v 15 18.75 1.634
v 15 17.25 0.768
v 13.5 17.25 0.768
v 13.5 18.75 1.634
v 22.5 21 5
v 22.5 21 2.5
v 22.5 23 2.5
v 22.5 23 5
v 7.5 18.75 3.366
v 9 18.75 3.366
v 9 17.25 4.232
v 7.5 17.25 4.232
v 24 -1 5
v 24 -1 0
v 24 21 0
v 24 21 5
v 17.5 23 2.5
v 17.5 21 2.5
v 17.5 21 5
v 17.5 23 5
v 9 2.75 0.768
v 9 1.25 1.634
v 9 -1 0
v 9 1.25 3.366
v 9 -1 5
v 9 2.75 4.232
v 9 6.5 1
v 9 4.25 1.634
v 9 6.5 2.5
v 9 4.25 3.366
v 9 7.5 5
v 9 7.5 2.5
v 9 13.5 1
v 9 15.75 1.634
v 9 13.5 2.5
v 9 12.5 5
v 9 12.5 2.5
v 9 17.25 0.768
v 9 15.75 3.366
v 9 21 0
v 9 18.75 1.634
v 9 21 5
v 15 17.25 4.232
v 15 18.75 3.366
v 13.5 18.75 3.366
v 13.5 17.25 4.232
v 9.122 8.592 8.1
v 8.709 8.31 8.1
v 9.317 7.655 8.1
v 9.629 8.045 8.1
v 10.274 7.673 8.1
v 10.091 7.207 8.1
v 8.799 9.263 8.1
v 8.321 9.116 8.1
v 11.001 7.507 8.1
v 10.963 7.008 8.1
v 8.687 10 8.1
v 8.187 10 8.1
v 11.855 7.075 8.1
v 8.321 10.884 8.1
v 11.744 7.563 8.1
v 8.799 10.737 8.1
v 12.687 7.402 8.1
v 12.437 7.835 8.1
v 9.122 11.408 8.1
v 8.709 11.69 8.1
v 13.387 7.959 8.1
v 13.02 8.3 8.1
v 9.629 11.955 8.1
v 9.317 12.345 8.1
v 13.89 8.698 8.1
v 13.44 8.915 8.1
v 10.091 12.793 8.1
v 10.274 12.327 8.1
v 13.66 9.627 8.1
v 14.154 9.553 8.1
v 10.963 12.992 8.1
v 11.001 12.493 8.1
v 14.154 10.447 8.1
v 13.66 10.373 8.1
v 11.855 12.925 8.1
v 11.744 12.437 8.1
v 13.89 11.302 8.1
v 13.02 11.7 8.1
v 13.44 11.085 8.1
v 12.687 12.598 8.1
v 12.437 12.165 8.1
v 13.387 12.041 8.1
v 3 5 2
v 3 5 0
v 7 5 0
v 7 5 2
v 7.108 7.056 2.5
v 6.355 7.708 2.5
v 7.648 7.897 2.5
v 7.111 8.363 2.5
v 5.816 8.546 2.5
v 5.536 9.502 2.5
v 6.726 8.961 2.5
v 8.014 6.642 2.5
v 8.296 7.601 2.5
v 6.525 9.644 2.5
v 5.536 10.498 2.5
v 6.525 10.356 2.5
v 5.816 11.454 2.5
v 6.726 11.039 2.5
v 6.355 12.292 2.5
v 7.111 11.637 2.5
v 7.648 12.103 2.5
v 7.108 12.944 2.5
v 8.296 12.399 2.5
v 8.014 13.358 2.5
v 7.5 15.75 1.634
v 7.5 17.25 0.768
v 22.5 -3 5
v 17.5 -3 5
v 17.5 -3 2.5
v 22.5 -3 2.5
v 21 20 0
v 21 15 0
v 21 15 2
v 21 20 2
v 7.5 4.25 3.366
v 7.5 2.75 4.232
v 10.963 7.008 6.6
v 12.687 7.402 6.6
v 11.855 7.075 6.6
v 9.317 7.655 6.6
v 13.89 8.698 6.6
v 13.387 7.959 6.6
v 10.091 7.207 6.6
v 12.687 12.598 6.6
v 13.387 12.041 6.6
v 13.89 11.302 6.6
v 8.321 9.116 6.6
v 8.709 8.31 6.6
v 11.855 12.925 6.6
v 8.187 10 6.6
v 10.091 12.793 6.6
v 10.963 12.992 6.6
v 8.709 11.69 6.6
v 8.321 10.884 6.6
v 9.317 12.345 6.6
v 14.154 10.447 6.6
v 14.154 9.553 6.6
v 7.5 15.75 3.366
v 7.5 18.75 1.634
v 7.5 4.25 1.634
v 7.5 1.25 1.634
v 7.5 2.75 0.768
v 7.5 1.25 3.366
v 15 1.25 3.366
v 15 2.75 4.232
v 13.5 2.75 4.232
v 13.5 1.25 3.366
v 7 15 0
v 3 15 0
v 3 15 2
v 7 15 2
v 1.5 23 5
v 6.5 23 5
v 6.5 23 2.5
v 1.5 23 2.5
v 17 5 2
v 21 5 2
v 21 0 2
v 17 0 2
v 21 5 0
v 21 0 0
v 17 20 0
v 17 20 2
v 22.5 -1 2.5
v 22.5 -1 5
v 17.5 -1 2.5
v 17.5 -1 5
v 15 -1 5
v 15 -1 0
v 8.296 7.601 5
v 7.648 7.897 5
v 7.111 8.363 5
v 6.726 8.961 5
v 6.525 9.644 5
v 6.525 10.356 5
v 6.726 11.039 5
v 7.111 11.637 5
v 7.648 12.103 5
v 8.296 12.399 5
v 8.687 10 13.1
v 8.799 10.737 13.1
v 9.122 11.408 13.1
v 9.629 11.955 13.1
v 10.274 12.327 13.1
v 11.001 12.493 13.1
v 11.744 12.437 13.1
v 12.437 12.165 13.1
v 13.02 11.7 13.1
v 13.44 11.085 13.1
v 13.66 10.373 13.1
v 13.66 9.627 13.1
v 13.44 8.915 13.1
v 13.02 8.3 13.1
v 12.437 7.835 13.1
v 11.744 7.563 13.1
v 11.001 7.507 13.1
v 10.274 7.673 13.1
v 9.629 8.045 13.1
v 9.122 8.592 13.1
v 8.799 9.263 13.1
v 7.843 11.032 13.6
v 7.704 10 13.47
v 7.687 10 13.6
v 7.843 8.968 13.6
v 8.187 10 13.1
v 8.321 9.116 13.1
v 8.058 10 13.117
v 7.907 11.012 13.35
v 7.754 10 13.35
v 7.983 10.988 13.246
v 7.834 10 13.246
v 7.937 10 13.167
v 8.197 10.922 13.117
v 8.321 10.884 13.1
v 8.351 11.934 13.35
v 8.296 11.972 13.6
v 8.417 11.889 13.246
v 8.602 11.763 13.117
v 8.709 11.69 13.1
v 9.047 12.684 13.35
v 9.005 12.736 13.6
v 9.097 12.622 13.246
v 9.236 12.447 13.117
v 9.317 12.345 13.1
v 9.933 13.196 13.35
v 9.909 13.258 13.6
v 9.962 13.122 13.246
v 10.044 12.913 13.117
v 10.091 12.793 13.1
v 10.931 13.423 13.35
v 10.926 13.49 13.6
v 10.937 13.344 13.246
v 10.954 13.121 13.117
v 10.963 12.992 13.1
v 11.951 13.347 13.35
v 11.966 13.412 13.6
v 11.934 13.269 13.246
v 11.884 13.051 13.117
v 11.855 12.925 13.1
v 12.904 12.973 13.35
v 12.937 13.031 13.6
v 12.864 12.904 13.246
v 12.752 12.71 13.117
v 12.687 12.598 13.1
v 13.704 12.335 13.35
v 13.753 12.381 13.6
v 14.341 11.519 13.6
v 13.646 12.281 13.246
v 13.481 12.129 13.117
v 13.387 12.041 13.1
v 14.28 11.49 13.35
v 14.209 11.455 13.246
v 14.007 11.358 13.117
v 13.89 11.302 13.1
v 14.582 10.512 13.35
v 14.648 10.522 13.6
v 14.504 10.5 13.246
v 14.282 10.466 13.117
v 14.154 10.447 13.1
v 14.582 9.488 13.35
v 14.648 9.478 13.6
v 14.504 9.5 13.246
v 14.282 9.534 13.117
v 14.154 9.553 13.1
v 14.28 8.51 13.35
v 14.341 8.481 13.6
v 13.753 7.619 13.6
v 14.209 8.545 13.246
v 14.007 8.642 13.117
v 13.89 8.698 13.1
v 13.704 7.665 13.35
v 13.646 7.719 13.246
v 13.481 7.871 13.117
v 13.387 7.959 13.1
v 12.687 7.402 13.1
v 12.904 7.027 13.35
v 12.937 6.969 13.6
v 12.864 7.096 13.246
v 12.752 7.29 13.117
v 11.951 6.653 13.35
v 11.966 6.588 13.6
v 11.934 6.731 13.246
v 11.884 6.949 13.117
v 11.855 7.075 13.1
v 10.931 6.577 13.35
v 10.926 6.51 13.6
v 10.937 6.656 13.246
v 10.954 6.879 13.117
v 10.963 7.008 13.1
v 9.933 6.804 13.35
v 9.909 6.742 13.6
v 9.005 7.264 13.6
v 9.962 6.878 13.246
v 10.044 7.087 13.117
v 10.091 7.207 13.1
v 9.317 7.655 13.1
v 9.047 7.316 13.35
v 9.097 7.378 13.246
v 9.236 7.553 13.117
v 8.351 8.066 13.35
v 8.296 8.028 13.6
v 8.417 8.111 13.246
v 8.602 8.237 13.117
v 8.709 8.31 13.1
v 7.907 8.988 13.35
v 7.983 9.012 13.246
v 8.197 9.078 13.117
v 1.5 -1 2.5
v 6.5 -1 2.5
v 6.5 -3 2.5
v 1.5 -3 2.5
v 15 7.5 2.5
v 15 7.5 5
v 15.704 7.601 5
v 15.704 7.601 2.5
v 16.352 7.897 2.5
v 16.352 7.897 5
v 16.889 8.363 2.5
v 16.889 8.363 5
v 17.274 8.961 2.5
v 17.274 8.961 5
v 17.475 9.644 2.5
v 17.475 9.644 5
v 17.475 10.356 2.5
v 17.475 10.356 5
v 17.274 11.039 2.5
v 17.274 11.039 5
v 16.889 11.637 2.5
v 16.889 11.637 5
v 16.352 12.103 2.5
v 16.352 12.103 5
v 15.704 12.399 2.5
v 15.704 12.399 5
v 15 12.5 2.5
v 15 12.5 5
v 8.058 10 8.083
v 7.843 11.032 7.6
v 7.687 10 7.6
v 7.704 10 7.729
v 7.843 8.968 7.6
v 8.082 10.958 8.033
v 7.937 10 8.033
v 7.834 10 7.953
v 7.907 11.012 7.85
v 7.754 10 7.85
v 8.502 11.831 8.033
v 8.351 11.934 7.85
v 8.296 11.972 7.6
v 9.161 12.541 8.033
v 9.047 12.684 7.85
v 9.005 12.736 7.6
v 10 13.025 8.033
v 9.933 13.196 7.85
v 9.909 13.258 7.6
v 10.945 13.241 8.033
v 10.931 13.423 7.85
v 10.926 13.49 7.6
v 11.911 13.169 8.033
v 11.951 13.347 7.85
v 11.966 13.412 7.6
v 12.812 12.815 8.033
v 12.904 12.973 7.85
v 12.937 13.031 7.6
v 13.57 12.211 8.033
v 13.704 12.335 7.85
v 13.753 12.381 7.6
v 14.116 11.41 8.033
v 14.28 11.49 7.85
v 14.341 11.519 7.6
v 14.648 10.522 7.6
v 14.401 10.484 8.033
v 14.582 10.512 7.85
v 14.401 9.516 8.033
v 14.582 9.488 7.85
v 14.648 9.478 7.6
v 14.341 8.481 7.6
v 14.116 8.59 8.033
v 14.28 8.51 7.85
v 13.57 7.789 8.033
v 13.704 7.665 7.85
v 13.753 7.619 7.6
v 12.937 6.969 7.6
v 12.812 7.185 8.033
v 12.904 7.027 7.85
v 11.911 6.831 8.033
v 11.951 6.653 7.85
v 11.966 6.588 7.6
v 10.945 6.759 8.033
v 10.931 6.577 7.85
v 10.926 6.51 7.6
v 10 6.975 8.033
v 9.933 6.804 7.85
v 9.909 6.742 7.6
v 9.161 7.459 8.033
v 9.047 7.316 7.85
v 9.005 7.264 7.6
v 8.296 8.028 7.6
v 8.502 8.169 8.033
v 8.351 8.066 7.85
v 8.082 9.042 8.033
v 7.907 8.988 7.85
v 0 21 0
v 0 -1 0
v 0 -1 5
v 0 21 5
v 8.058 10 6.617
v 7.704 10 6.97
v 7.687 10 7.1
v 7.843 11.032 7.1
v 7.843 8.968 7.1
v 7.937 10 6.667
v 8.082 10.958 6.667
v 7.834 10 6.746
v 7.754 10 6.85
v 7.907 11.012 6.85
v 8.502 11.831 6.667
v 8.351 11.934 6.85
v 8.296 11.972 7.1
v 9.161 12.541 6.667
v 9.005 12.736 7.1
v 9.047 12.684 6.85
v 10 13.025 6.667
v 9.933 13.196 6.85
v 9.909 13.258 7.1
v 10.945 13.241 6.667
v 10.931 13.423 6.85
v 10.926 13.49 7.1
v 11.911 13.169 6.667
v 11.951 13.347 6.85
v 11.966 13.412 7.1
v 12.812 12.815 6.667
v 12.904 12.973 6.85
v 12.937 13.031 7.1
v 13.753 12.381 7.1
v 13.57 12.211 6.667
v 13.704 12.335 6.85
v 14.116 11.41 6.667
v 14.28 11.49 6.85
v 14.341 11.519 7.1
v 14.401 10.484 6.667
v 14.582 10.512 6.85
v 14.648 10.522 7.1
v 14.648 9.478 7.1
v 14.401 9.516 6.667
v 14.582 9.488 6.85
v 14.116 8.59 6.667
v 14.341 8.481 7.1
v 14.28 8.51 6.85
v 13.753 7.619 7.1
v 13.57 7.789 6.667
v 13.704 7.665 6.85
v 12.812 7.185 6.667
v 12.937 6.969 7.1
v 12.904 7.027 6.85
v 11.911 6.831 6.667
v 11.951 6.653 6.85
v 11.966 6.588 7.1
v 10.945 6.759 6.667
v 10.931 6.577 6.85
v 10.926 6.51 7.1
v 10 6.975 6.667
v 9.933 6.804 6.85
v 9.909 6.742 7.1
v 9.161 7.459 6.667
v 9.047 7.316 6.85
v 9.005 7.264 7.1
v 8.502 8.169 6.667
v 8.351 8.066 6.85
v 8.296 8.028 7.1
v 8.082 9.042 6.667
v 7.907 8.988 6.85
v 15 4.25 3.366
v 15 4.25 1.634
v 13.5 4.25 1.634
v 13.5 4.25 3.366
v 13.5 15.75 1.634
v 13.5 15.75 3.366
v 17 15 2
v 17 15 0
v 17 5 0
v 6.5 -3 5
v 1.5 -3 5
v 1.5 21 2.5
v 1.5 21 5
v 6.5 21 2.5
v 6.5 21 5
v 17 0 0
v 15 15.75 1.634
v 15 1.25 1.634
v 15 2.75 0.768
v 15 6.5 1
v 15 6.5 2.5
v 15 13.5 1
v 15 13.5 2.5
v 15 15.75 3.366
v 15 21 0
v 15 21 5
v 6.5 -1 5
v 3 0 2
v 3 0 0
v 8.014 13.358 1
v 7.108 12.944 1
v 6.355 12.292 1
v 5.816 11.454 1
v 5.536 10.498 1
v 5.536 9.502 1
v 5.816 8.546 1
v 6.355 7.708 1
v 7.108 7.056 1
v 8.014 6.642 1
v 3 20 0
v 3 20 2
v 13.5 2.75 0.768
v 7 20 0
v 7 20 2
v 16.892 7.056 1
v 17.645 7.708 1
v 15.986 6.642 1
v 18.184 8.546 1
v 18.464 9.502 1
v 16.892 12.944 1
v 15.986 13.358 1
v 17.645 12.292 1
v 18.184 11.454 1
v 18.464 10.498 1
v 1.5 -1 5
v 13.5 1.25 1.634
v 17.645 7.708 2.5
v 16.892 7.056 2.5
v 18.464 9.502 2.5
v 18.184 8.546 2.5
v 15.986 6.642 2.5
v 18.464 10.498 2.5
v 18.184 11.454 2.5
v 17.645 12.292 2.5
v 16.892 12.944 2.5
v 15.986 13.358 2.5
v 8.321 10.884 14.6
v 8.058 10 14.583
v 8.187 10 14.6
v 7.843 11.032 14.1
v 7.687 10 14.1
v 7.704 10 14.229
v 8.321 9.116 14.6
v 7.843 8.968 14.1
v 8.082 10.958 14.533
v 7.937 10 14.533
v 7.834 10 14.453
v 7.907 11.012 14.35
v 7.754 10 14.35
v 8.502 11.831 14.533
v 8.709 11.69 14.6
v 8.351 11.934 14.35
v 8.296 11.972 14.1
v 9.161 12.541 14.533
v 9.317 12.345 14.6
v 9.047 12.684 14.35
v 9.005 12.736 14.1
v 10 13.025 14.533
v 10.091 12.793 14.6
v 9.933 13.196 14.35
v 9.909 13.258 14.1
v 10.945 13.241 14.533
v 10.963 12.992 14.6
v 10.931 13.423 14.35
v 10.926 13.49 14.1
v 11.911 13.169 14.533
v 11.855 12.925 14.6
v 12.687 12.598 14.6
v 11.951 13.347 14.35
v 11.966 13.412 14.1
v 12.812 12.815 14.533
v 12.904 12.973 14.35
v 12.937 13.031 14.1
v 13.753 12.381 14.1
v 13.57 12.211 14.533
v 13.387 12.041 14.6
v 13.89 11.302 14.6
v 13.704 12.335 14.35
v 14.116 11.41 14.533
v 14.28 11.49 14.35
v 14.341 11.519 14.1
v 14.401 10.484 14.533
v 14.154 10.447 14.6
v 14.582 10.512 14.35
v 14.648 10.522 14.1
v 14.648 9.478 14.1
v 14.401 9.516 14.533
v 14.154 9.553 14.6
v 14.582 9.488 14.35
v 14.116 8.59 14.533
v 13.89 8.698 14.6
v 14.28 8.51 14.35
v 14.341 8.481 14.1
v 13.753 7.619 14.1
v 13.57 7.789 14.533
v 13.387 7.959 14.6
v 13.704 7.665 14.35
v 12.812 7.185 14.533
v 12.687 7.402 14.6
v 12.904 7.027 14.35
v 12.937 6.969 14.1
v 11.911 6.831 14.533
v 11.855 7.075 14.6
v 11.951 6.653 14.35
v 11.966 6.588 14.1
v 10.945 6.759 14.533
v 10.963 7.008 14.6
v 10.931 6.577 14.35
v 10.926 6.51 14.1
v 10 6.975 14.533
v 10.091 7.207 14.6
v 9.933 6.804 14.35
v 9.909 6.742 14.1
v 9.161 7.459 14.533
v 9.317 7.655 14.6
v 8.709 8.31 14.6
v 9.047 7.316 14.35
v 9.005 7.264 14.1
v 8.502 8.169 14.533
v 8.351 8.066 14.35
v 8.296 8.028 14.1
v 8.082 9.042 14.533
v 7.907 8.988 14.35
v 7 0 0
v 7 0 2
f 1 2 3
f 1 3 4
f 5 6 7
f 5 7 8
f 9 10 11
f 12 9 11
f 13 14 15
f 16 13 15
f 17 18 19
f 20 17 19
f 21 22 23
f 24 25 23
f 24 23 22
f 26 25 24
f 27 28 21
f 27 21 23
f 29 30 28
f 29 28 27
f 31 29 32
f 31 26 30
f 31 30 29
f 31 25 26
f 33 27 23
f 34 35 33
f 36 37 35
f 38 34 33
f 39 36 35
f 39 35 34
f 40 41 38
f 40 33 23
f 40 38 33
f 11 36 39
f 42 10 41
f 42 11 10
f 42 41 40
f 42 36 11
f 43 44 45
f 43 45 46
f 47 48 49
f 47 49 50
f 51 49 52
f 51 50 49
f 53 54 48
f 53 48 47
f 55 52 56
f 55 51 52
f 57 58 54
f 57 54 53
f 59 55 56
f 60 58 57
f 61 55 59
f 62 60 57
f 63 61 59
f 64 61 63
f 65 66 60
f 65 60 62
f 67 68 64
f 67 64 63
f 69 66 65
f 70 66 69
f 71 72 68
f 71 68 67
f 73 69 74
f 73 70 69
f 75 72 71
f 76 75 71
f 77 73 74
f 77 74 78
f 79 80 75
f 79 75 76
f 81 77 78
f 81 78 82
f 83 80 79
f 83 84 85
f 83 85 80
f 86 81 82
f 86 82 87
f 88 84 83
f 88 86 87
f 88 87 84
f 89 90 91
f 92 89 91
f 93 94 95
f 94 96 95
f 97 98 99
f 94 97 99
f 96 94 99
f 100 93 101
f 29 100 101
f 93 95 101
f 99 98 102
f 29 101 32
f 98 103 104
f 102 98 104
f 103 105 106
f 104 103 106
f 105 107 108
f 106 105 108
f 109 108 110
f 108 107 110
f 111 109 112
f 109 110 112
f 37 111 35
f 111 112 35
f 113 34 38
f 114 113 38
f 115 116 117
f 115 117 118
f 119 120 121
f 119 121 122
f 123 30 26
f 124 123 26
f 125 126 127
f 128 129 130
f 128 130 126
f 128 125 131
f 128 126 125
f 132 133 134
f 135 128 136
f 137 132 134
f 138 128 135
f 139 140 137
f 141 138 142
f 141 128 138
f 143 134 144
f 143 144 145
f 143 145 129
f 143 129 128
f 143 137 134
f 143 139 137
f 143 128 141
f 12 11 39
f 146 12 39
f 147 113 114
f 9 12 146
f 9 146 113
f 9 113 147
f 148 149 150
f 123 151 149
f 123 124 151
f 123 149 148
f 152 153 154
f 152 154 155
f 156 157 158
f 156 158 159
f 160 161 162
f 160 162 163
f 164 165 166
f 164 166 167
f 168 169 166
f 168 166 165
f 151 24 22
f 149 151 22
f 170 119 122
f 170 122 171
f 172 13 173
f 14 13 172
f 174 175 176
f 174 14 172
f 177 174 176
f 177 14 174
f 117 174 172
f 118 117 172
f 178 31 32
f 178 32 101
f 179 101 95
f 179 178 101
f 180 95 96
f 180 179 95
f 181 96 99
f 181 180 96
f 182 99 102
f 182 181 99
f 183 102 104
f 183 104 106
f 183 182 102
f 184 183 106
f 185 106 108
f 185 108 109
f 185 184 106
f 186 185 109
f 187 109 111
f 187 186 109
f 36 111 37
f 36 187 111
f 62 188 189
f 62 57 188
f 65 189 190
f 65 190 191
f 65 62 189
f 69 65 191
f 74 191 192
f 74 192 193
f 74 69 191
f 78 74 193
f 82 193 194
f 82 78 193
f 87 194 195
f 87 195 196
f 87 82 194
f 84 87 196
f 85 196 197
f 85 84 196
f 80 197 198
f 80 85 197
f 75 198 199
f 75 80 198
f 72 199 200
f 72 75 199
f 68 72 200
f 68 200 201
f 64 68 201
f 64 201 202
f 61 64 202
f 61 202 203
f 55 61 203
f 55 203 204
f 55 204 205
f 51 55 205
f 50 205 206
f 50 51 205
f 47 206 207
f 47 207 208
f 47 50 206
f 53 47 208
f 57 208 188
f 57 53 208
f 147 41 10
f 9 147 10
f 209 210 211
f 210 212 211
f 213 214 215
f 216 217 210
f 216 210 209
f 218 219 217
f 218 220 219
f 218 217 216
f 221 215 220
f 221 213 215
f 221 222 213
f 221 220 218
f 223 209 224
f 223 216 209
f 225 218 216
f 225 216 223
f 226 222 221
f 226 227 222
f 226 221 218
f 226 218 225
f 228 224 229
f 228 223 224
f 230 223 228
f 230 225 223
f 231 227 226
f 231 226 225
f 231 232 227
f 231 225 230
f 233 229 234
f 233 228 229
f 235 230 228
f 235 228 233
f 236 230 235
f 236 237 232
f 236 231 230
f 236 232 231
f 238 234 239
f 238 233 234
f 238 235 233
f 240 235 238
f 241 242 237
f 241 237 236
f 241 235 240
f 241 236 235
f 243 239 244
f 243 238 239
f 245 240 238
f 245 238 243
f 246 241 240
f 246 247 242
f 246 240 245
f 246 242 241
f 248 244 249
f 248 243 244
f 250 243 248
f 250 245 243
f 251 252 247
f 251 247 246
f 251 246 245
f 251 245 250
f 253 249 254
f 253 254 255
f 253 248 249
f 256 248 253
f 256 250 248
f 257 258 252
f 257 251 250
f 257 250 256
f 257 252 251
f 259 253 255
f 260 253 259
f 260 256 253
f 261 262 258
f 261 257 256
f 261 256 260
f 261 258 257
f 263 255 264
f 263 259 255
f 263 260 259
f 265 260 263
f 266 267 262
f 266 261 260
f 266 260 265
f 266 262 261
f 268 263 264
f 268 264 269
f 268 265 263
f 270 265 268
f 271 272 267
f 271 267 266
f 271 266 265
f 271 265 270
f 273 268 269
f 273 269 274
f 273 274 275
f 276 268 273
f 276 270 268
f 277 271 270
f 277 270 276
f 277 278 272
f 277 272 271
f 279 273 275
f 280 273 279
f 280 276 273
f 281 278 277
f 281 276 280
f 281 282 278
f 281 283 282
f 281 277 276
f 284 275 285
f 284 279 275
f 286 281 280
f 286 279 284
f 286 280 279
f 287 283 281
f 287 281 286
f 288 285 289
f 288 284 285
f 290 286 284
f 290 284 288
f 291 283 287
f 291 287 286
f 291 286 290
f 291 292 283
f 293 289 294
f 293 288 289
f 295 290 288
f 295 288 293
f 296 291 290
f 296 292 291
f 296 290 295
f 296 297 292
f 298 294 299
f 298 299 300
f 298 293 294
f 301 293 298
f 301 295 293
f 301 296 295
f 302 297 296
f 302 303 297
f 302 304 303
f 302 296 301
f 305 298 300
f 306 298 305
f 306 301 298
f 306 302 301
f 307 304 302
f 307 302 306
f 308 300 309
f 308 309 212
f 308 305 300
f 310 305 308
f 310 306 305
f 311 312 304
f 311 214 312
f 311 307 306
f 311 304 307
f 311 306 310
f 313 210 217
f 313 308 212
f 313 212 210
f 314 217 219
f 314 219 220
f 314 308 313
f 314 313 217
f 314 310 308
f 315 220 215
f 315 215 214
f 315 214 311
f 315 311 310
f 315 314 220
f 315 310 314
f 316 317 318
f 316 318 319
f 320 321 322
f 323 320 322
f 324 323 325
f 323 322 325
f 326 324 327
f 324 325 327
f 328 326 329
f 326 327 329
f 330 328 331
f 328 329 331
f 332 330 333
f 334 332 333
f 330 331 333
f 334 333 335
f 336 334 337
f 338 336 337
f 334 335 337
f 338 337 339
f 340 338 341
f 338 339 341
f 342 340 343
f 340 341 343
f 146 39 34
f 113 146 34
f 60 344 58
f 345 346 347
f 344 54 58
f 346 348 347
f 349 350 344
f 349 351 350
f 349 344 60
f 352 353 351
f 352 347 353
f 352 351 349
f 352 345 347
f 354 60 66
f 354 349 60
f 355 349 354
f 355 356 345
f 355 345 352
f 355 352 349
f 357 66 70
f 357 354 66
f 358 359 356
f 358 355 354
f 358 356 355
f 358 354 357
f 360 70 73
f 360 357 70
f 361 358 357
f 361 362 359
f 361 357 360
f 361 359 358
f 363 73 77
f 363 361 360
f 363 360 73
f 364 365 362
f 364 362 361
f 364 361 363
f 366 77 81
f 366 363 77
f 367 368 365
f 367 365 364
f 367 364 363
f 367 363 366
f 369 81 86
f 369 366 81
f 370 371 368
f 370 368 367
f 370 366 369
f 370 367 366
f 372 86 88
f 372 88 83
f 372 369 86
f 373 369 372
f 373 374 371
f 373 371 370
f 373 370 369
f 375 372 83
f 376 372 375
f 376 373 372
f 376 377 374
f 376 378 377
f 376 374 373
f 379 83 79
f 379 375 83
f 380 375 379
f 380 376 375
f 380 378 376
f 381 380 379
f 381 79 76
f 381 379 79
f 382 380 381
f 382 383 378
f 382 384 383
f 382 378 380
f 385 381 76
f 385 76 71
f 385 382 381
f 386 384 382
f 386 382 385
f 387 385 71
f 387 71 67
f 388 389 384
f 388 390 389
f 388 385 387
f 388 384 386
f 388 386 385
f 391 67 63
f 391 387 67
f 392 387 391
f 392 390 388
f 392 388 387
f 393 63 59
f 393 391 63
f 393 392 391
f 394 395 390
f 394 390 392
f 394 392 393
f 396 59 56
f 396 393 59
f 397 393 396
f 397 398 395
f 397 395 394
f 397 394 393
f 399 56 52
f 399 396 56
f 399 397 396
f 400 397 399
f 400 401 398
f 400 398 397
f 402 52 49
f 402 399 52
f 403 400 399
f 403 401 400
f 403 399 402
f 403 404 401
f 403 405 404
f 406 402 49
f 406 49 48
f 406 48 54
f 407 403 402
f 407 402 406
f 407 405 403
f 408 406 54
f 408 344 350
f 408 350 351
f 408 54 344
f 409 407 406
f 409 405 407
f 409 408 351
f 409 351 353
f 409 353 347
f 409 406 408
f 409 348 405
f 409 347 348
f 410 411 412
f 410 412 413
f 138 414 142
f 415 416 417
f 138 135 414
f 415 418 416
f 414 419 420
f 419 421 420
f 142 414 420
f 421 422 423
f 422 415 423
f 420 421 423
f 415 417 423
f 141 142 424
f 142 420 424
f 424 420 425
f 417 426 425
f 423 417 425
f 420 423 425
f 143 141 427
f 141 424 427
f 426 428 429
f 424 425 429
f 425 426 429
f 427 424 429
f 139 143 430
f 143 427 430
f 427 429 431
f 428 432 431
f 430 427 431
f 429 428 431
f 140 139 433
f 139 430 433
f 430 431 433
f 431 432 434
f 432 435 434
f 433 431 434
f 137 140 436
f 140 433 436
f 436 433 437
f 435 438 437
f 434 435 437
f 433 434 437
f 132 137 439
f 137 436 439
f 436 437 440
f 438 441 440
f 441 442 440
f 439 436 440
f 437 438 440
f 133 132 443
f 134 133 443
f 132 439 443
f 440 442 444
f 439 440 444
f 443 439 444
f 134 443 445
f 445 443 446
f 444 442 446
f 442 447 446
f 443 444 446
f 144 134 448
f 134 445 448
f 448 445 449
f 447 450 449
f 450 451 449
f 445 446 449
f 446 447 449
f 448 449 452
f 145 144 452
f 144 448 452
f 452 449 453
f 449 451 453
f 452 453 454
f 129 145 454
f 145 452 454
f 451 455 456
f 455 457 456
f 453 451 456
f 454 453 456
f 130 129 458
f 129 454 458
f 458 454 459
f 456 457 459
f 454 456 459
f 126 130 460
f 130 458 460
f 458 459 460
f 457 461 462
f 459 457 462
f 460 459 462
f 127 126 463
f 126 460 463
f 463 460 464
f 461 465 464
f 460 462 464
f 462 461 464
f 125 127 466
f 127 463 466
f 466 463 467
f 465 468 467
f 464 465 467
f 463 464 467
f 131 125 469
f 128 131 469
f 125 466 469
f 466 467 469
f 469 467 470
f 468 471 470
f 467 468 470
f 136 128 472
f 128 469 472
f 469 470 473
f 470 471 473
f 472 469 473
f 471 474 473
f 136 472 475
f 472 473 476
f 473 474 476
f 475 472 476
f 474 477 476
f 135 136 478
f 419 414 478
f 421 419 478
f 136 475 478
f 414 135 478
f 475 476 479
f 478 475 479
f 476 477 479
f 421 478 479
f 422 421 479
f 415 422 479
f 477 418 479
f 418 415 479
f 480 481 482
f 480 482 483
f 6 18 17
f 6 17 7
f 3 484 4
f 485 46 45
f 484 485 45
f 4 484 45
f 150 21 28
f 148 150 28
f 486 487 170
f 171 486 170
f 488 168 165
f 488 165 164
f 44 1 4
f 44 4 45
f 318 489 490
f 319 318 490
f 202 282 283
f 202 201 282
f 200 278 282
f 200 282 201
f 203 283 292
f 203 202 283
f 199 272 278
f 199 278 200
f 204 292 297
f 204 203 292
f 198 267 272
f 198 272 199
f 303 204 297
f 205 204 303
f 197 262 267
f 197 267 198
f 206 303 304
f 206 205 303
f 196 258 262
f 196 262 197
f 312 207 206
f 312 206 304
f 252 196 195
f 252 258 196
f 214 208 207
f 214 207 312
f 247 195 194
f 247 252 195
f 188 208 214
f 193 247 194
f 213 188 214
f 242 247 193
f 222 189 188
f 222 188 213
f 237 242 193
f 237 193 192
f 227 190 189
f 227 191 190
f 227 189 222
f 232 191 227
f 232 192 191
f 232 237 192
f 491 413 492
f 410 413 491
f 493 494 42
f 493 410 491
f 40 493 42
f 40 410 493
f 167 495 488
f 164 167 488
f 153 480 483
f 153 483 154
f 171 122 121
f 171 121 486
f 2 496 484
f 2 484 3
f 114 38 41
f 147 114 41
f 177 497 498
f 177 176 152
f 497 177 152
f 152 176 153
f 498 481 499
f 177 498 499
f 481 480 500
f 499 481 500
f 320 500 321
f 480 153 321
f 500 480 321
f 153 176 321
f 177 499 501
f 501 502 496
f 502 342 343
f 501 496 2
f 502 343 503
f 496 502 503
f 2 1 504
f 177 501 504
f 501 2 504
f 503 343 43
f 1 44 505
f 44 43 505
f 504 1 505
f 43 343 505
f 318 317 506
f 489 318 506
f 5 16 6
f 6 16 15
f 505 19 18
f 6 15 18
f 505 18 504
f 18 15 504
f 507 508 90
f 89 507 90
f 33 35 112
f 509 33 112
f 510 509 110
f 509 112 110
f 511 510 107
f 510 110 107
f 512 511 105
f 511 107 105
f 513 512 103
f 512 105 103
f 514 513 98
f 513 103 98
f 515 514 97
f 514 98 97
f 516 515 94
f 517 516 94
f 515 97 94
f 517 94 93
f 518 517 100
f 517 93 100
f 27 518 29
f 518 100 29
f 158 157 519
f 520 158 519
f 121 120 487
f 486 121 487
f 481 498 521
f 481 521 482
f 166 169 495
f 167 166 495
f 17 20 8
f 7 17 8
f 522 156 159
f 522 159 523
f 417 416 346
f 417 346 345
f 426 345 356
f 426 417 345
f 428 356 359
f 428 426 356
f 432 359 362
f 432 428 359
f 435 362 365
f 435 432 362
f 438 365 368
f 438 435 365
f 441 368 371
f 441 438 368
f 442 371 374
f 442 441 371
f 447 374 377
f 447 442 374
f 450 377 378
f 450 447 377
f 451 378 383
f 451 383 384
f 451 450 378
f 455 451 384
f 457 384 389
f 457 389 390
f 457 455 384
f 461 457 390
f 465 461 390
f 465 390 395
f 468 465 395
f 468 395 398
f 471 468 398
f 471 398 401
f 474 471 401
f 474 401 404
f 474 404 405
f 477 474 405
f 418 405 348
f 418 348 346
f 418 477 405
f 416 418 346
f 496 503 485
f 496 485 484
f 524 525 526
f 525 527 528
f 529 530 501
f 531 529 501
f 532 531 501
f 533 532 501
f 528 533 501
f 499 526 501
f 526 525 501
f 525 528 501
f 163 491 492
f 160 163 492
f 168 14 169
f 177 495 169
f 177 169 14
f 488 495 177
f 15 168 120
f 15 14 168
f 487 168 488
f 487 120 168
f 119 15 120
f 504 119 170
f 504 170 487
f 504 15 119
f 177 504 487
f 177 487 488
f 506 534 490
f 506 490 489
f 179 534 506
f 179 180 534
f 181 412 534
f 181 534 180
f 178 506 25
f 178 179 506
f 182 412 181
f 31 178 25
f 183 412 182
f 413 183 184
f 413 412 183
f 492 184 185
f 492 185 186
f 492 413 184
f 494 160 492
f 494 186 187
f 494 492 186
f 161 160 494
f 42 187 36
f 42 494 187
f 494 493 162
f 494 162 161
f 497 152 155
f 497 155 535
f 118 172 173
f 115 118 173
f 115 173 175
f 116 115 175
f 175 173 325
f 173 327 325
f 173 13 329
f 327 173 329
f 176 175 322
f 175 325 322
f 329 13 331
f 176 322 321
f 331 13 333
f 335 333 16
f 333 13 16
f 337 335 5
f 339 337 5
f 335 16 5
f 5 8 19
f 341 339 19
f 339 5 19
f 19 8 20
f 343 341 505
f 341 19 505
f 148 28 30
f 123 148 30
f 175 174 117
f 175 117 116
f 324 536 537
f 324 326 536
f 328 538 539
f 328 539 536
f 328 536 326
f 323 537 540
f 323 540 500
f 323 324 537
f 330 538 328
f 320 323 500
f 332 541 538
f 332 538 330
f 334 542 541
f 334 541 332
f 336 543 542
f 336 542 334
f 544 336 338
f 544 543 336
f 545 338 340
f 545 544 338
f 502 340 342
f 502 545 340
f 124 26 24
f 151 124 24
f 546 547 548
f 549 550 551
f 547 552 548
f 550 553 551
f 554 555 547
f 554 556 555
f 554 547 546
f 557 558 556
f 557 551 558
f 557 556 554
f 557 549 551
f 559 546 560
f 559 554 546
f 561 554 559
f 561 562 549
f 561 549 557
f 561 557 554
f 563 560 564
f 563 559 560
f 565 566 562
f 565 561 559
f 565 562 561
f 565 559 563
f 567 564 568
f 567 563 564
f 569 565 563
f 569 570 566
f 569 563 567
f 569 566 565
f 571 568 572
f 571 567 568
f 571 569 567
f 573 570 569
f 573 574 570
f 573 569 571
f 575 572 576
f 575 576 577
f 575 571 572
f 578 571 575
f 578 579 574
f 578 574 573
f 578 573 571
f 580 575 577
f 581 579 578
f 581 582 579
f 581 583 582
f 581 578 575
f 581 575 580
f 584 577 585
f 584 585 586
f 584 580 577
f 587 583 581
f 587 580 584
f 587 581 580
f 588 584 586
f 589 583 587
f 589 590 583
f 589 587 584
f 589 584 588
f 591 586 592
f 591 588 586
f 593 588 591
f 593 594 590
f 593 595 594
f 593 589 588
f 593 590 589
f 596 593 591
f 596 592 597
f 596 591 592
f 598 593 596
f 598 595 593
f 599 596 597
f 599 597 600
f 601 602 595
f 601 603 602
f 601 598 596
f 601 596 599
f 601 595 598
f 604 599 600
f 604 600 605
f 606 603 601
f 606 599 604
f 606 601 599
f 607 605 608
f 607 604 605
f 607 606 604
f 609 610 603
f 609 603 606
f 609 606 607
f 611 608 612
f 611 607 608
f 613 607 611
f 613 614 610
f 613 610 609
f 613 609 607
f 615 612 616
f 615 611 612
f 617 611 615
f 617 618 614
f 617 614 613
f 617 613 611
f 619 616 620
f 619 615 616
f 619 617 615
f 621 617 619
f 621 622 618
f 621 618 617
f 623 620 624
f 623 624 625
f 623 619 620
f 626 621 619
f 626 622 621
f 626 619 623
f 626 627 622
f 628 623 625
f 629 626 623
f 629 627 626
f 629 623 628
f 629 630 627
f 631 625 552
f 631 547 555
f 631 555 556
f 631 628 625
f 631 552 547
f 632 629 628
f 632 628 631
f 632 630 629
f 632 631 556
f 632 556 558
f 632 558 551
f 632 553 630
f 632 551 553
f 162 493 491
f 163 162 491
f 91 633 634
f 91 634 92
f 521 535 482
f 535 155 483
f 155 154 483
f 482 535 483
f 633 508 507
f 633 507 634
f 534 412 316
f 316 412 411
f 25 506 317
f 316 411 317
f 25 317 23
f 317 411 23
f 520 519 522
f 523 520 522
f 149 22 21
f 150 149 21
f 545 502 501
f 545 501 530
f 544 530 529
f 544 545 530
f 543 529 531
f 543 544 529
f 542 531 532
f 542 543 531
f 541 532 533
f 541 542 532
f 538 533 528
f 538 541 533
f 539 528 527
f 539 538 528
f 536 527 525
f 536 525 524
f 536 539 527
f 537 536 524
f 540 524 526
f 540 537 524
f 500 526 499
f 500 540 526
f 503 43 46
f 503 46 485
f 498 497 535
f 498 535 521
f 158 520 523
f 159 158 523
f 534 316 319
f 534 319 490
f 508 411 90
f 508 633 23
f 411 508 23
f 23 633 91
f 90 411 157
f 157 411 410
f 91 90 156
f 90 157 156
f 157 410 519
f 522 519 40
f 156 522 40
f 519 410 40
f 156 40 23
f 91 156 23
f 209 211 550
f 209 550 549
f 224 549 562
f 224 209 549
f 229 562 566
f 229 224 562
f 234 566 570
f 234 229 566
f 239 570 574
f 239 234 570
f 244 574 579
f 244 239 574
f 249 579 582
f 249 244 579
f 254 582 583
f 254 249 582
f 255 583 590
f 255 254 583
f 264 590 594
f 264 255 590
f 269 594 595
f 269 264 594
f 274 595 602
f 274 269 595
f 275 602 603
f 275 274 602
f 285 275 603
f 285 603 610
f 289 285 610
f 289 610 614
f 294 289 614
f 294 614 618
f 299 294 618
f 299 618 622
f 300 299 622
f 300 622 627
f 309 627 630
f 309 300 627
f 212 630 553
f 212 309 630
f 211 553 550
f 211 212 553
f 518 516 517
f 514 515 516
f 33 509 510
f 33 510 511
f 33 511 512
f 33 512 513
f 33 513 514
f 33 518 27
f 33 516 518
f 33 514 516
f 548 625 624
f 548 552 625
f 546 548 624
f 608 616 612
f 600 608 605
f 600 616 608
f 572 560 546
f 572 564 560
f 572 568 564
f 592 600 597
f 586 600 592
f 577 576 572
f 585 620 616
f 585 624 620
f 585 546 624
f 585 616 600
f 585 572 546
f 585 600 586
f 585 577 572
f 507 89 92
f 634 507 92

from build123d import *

# Parameters (mm, degrees)
F0_W      = 9
F0_H      = 22
F0_W_2    = 4
F0_H_2    = 5
F1_DEPTH  = 5
F2_DEPTH  = 2
F4_DEPTH  = 4
F5_DEPTH  = 2.5
F7_DEPTH  = 1.5
F8_W      = 5
F8_H      = 2.5
F9_DEPTH  = 2
F13_DEPTH = 3
F16_R     = 0.5


# Not quite as in the source:
# - a pattern or mirror of a feature is missing from the dataset's text; its kind, count and spacing are read off the source's solid


with BuildPart() as f1:
    # F0 (on Top) → F1 (new body)
    with BuildSketch(Plane.XY):
        with Locations((4.5, 10)):
            Rectangle(F0_W, F0_H)
        with Locations((5, 2.5)):
            Rectangle(F0_W_2, F0_H_2, mode=Mode.SUBTRACT)
        with Locations((5, 17.5)):
            Rectangle(F0_W_2, F0_H_2, mode=Mode.SUBTRACT)
        with Locations((5, 17.5)):
            Rectangle(F0_W_2, F0_H_2)
        with Locations((5, 2.5)):
            Rectangle(F0_W_2, F0_H_2)
    extrude(amount=F1_DEPTH)

    # F0 (on Top) → F2 (cut)
    with BuildSketch(Plane.XY):
        with Locations((5, 2.5)):
            Rectangle(F0_W_2, F0_H_2)
        with Locations((5, 17.5)):
            Rectangle(F0_W_2, F0_H_2)
    extrude(amount=F2_DEPTH, mode=Mode.SUBTRACT)

    # F3 (on face) → F4 (cut)
    with BuildSketch(Plane.XY.offset(5)):
        with BuildLine():
            Line((9, 12.5), (9, 13.5))
            ThreePointArc((9, 13.5), (5.5, 10), (9, 6.5))
            Line((9, 6.5), (9, 7.5))
            ThreePointArc((9, 7.5), (6.5, 10), (9, 12.5))
        make_face()
        with BuildLine():
            Line((9, 7.5), (9, 12.5))
            ThreePointArc((9, 12.5), (6.5, 10), (9, 7.5))
        make_face()
    extrude(amount=-F4_DEPTH, mode=Mode.SUBTRACT)

    # F3 (on face) → F5 (join)
    with BuildSketch(Plane.XY.offset(5)):
        with BuildLine():
            Line((9, 12.5), (9, 13.5))
            ThreePointArc((9, 13.5), (5.5, 10), (9, 6.5))
            Line((9, 6.5), (9, 7.5))
            ThreePointArc((9, 7.5), (6.5, 10), (9, 12.5))
        make_face()
    extrude(amount=-F5_DEPTH)

    # F6 (on face) → F7 (cut)
    with BuildSketch(Plane.YZ.offset(9)):
        Polygon((1.25, 3.3660254038), (1.25, 1.6339745962), (2.75, 0.7679491924), (4.25, 1.6339745962), (4.25, 3.3660254038), (2.75, 4.2320508076), align=None)
        Polygon((18.75, 1.6339745962), (18.75, 3.3660254038), (17.25, 4.2320508076), (15.75, 3.3660254038), (15.75, 1.6339745962), (17.25, 0.7679491924), align=None)
    extrude(amount=-F7_DEPTH, mode=Mode.SUBTRACT)

    # F8 (on face) → F9 (join)
    with BuildSketch(Plane(origin=(0, 21, 0), x_dir=(-1, 0, 0), z_dir=(0, 1, 0))):
        with Locations((-4, 3.75)):
            Rectangle(F8_W, F8_H)
    f9 = extrude(amount=F9_DEPTH)

    # F9_copies: F9 across plane
    add(f9.mirror(Plane(origin=(0, 10, 0), x_dir=(0, 0, -1), z_dir=(0, -1, 0))))


with BuildPart() as f12_1:
    # F12: instance of F1
    add(f1.part.mirror(Plane.YZ.offset(12)))

    # F13 (add): faces of the model
    f13_faces = [f12_1.faces().sort_by_distance(p)[0] for p in [
        (16.5, 2.75, 2.5),
        (16.5, 17.25, 2.5),
    ]]
    extrude(f13_faces, amount=F13_DEPTH)


with BuildPart() as f15:
    # F14 (on offset) → F15 (revolve)
    with BuildSketch(Plane.XZ.offset(-10)):
        Polygon((7.6874490976, 6.599618122), (11.1874490976, 6.599618122), (11.1874490976, 14.599618122), (7.6874490976, 14.599618122), (7.6874490976, 13.099618122), (8.6874490976, 13.099618122), (8.6874490976, 10.599618122), (8.6874490976, 8.099618122), (7.6874490976, 8.099618122), align=None)
    revolve(axis=Axis((11.1874490976, 10, 10.599618122), (0, 0, -1)))

    # F16
    f16_edges = [f15.edges().sort_by_distance(p)[0] for p in [
        (14.687449, 10, 14.599618),
        (14.687449, 10, 8.099618),
        (14.687449, 10, 13.099618),
        (7.687449, 10, 13.849618),
        (14.687449, 10, 6.599618),
        (7.687449, 10, 7.349618),
    ]]
    fillet(f16_edges, radius=F16_R)


solid = Compound([f1.part, f12_1.part, f15.part])
